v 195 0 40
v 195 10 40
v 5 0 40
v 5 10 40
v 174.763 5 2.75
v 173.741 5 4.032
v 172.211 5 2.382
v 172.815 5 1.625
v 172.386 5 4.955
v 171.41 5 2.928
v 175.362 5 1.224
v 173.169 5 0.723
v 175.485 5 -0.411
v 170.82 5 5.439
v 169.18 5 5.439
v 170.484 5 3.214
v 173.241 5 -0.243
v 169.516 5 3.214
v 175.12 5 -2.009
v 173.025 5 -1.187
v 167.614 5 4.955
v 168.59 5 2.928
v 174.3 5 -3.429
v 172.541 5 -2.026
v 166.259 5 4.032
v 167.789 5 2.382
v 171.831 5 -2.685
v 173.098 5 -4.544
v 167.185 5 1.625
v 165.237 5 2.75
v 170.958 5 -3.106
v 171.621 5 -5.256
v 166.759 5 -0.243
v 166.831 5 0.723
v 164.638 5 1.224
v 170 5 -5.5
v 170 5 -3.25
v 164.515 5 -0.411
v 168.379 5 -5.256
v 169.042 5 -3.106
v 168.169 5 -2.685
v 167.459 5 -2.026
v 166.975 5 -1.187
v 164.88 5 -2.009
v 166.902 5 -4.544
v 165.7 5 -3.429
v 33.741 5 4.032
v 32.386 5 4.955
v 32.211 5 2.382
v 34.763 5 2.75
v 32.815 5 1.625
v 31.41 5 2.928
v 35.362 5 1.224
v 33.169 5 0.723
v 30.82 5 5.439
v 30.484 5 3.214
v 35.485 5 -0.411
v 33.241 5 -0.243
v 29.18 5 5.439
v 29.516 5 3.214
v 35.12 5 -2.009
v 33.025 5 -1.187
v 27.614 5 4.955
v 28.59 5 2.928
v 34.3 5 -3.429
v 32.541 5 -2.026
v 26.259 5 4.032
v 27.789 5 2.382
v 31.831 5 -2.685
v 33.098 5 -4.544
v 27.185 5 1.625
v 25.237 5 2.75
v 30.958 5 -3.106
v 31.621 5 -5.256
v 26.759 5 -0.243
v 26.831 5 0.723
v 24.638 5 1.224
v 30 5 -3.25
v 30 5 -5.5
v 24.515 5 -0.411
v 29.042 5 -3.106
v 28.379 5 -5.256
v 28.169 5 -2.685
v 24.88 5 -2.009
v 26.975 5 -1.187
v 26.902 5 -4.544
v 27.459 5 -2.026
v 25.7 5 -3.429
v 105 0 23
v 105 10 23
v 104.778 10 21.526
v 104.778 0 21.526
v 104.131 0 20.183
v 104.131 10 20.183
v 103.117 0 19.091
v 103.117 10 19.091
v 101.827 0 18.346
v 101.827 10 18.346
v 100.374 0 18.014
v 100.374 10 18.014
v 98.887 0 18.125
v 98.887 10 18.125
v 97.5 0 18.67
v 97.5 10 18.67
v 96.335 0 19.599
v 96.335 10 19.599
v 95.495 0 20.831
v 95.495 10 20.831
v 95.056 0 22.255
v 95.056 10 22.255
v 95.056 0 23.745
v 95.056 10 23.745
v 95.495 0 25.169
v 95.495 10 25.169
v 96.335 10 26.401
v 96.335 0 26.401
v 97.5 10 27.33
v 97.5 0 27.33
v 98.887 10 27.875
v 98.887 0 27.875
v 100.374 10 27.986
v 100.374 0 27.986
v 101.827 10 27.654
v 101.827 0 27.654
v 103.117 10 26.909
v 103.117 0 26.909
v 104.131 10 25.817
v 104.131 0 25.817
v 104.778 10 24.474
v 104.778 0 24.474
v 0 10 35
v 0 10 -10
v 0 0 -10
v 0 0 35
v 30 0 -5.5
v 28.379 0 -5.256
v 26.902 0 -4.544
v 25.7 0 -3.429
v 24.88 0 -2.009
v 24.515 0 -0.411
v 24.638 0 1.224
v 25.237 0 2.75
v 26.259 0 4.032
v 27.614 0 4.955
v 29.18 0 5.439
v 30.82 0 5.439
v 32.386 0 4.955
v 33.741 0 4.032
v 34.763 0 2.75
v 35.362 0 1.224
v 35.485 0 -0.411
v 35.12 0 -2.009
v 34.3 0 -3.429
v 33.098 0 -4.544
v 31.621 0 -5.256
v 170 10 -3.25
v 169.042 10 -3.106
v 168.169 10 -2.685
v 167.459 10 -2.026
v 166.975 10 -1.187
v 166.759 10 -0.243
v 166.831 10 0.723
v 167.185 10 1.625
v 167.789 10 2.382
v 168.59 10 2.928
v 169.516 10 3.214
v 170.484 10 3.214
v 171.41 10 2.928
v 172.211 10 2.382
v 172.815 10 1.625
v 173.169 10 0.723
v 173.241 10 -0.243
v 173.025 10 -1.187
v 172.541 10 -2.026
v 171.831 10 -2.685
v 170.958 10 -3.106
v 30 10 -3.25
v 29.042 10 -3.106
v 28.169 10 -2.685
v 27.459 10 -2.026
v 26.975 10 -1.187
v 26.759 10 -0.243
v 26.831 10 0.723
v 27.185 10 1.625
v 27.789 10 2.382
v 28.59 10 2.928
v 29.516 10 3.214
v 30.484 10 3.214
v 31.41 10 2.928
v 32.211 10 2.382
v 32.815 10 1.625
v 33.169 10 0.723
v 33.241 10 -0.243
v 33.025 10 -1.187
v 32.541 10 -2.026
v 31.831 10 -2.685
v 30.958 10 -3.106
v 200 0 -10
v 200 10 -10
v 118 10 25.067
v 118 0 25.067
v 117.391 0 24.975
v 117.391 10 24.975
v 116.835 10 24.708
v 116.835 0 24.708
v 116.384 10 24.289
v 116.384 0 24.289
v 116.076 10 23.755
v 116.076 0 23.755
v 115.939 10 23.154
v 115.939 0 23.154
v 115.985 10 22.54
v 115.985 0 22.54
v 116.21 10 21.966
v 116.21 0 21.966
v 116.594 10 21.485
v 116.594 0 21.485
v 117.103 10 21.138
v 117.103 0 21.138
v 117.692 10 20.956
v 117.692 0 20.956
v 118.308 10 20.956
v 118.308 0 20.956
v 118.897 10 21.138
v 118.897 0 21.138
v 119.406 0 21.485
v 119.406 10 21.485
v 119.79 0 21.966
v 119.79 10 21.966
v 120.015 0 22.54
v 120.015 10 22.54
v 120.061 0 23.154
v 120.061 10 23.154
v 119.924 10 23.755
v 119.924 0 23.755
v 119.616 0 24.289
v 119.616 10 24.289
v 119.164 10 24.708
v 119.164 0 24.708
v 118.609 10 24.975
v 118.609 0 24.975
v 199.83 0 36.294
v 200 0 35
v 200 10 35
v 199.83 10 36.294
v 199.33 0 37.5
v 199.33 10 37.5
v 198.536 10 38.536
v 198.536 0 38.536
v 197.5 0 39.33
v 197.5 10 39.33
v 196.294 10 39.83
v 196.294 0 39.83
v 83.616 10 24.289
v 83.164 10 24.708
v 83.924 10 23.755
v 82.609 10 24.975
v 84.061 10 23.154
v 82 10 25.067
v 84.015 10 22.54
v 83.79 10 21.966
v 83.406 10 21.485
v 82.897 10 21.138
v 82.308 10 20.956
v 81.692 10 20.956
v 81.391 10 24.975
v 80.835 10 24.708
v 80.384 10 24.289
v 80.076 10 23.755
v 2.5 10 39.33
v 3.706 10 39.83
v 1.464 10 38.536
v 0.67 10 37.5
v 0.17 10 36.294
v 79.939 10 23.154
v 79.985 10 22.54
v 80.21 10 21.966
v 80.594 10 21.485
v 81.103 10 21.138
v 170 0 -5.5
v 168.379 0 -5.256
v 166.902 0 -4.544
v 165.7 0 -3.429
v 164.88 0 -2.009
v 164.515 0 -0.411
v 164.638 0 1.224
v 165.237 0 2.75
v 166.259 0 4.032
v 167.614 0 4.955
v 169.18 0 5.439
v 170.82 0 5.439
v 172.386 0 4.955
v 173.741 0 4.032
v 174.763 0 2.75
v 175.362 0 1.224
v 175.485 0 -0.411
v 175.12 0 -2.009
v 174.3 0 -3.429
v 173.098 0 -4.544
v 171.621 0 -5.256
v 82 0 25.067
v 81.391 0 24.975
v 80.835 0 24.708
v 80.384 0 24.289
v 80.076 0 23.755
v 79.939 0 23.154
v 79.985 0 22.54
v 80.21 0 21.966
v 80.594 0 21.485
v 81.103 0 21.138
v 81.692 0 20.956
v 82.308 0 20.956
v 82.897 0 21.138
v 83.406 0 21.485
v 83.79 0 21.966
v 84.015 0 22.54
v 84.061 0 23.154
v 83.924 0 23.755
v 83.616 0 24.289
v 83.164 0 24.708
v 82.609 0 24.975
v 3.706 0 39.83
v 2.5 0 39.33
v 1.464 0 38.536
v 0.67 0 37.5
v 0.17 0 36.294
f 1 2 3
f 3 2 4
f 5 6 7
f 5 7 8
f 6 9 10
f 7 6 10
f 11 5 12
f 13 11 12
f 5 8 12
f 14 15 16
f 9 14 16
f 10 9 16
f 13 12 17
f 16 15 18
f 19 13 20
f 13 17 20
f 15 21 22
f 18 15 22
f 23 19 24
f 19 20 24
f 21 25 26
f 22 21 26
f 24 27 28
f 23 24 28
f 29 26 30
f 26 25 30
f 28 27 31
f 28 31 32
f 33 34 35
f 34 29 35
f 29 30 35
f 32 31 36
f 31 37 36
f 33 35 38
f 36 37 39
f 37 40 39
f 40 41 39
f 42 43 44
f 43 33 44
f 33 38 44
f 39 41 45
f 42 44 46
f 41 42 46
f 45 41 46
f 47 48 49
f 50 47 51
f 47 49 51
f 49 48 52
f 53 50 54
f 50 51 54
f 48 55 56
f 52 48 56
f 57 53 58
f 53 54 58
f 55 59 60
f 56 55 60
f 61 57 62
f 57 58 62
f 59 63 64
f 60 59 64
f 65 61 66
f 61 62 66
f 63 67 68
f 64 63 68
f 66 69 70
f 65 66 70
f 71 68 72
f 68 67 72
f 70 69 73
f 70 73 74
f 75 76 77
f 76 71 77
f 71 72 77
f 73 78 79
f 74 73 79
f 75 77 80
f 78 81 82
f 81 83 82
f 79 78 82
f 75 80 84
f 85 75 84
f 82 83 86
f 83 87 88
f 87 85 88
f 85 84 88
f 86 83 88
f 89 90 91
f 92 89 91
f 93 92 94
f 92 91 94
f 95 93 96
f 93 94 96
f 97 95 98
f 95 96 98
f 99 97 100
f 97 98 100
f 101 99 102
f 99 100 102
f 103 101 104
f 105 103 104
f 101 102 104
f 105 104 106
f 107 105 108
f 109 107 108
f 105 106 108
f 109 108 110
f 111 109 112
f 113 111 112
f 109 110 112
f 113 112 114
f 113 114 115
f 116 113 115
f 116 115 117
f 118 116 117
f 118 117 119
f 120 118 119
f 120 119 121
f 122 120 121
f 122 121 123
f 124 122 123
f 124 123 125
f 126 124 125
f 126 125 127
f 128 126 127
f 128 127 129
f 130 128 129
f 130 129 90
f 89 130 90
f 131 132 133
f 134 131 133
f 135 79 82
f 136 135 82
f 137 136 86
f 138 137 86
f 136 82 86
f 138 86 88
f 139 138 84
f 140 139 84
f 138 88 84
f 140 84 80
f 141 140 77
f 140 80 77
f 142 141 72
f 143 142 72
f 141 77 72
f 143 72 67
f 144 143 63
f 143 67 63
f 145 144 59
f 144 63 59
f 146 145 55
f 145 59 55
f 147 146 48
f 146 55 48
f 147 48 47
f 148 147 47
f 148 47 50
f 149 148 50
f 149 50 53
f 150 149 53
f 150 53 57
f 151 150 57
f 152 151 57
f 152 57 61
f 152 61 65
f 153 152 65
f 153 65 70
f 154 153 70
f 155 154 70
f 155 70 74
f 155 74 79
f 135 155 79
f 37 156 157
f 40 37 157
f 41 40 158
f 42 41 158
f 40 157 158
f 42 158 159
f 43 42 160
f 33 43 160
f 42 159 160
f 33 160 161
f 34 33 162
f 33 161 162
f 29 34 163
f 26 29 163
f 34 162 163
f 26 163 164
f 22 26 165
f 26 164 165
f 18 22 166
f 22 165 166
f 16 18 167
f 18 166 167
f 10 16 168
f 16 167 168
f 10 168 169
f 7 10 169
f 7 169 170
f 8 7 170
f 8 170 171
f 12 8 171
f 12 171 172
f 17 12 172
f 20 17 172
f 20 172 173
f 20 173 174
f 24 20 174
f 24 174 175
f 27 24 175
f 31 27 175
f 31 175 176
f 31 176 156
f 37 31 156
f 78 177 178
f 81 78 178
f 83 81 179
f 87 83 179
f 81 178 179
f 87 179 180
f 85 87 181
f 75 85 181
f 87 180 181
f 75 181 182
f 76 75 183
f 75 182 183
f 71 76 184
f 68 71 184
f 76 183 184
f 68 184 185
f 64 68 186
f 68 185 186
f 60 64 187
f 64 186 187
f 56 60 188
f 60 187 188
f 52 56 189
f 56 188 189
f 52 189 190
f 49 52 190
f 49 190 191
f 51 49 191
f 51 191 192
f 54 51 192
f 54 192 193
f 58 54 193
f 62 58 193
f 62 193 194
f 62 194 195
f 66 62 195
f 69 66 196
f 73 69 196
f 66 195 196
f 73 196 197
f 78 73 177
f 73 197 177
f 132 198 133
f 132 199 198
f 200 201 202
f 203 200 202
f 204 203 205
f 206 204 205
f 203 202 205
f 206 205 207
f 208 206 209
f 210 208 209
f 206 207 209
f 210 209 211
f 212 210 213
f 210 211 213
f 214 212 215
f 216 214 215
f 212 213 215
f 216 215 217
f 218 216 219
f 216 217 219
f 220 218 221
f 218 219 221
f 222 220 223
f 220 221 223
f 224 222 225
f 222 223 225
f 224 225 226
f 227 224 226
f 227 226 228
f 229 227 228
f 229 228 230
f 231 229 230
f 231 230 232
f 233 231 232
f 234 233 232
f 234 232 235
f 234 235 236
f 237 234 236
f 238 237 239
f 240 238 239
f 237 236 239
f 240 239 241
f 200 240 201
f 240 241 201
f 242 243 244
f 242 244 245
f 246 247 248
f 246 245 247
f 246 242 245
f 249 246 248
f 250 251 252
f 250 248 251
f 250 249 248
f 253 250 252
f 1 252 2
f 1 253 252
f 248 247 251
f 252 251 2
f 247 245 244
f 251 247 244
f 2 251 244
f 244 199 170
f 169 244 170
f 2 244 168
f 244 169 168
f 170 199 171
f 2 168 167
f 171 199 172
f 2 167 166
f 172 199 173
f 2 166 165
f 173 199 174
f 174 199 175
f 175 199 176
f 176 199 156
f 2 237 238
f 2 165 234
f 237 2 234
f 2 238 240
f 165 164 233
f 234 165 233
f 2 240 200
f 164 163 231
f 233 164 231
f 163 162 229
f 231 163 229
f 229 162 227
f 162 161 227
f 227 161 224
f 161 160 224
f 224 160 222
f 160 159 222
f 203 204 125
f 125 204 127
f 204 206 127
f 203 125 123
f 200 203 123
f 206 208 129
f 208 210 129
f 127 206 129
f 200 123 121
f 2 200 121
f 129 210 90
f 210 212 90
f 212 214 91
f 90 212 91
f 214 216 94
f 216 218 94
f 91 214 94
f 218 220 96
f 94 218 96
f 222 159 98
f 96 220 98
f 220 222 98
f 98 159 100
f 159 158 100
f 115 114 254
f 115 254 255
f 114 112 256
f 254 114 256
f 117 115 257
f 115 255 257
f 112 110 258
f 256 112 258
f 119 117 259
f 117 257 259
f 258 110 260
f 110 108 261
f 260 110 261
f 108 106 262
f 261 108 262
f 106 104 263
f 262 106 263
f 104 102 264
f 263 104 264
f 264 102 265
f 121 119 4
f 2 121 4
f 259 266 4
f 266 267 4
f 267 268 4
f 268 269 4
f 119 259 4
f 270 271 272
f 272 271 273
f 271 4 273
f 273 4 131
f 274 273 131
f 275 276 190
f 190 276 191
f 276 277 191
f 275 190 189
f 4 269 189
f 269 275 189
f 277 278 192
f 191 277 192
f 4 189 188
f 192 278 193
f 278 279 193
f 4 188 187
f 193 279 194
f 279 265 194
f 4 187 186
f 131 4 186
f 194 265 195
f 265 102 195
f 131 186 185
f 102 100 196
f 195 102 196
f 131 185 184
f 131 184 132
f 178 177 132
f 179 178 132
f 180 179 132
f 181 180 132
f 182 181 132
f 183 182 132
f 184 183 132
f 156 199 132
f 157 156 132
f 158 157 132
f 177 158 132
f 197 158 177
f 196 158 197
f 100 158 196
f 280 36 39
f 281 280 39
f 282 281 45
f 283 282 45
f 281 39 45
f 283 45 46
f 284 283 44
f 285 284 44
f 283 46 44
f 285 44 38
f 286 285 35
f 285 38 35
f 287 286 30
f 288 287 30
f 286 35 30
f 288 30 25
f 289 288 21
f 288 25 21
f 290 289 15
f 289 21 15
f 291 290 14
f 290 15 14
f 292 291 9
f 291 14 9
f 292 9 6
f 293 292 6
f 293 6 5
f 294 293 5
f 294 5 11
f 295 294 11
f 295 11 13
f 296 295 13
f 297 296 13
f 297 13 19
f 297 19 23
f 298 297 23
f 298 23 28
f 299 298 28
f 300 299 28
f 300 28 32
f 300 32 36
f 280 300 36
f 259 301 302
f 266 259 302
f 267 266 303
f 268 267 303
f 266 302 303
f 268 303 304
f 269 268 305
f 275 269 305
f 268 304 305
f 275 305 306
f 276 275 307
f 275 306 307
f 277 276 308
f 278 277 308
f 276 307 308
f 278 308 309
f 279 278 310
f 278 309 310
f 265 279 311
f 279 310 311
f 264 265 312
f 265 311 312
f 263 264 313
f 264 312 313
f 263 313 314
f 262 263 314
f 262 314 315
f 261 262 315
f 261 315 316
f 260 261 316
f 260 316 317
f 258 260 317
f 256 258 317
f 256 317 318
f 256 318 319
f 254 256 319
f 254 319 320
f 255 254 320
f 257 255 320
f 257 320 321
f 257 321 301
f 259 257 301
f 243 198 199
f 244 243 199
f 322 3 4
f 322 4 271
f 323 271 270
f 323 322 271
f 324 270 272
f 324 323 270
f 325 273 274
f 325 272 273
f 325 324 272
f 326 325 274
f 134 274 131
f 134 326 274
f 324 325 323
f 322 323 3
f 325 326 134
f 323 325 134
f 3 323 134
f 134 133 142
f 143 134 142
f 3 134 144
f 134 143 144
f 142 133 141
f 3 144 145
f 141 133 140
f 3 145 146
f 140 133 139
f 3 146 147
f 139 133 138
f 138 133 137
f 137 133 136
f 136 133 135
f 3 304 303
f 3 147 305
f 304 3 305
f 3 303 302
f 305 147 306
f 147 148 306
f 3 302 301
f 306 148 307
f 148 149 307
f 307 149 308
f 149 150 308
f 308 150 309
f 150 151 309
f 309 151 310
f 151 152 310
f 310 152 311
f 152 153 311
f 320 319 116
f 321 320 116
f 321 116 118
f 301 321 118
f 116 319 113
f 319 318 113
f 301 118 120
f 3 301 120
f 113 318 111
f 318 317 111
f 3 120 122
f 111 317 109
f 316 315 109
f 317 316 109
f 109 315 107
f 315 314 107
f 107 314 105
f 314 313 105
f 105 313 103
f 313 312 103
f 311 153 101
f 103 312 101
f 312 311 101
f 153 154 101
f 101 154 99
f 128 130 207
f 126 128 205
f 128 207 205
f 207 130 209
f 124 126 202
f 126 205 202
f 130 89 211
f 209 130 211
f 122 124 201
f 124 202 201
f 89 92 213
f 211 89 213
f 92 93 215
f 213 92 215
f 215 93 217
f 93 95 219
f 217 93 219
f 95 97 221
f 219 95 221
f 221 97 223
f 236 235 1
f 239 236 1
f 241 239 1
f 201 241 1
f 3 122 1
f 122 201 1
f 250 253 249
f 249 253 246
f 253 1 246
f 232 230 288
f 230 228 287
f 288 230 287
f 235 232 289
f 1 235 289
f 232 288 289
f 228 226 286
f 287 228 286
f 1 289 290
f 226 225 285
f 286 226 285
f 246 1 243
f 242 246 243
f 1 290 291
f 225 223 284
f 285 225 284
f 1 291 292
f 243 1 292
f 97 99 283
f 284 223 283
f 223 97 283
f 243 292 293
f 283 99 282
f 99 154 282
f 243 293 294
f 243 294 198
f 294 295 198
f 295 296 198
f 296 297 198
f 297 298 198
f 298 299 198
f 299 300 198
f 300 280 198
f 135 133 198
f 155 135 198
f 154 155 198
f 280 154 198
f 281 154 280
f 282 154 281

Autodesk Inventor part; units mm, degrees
ref_plane "YZ Plane" through (0, 0, 0) normal (1, 0, 0) x (0, 1, 0)
ref_plane "XZ Plane" through (0, 0, 0) normal (0, 1, 0) x (-1, 0, 0)
ref_plane "XY Plane" through (0, 0, 0) normal (0, 0, 1) x (1, 0, 0)
sketch "Sketch1" plane through (0, 0, 0) normal (0, 0, 1) x (1, 0, 0)
  line L0 (0, 0) -> (200, 0)
  line L1 (200, 0) -> (200, 10)
  line L2 (200, 10) -> (0, 10)
  line L3 (0, 10) -> (0, 0)
  dimension "d0" = 200
  dimension "d1" = 10
extrude "Extrusion1" add sketch "Sketch1" along normal blind 50
sketch "Sketch2" plane through (0, 10, 0) normal (0, 1, 0) x (1, 0, 0)
  line L0 (200, 0) -> (200, -50) projected
  line L1 (200, -23) -> (-0.0003, -23)
  line L2 (200, 0) -> (0, 0) projected
  line L3 (100, 0) -> (100, -50)
  line L4 (200, -50) -> (0, -50) projected
  circle A0 centre (81.9998, -23) radius 2.5
  circle A1 centre (117.9998, -23) radius 2.5
  point P0 (99.9998, -23)
  dimension "d4" = 23
  dimension "d5" = 5
  dimension "d6" = 5
  dimension "d7" = 18
  dimension "d8" = 36
sketch "Sketch3" plane through (0, 0, 0) normal (0, 0, -1) x (-1, 0, 0)
  line L0 (0, 0) -> (-200, 0) projected
  line L1 (-200, 10) -> (0, 10) projected
  line L2 (0, 0) -> (-200, 0)
  line L3 (-200, 0) -> (-200, 10)
  line L4 (-200, 10) -> (0, 10)
  line L5 (0, 10) -> (0, 0)
extrude "Extrusion3" add sketch "Sketch3" along normal blind 10
sketch "Sketch4" plane through (0, 10, 50) normal (0, 1, 0) x (1, 0, 0)
  line L0 (0, 0) -> (200, 0) projected
  line L1 (100, 0) -> (100, 60)
  line L2 (0, 60) -> (200, 60) projected
  circle A0 centre (100, 27) radius 5
  point P0 (0, 50)
  dimension "d17" = 10
  dimension "d39" = 33
extrude "Extrusion4" cut sketch "Sketch4" against normal blind 10
sketch "Sketch5" plane through (0, 0, 50) normal (0, -1, 0) x (1, 0, 0)
  line L0 (140, -40) -> (140, -50) projected
  line L1 (140, -50) -> (60, -50) projected
  line L2 (60, -50) -> (60, -40) projected
  line L3 (0, -40) -> (60, -40) projected
  line L4 (0, -60) -> (0, -40) projected
  line L5 (0, -60) -> (200, -60) projected
  line L6 (200, -60) -> (200, -40) projected
  line L7 (140, -40) -> (200, -40) projected
  circle A0 centre (30, -50) radius 2.4585 projected
  circle A1 centre (170, -50) radius 2.4585 projected
  point P0 (0, -50)
  point P1 (170, -50)
  point P2 (30, -50)
  point P3 (200, -50)
  point P4 (170, -40)
  point P5 (30, -40)
hole "Hole1" at (170, 0, 0) at (30, 0, 0) direction (0, 1, 0) diameter 6.5 end through all counterbore diameter 11 counterbore depth 5
hole "Hole2" at (81.9998, 10, 23) at (117.9998, 10, 23) direction (0, -1, 0) diameter 4.134 end through all thread size "M5x0.8" class "6H" standard "ISO Metric profile"
sketch "Sketch6" plane through (0, 10, 50) normal (0, 1, 0) x (1, 0, 0)
  line L0 (200, 0) -> (0, 0) projected
  line L1 (0, 0) -> (200, 0)
  line L2 (200, 0) -> (200, 10)
  line L3 (200, 10) -> (0, 10)
  line L4 (0, 10) -> (0, 0)
  point P0 (0, 50)
  dimension "d35" = 10
extrude "Extrusion5" cut sketch "Sketch6" against normal through all
sketch "Sketch7" plane through (0, 10, -10) normal (0, 1, 0) x (1, 0, 0)
  point P0 (0, -10)
fillet "Fillet3" radius 5 2 edges at (0, 5, 40) (200, 5, 40)
properties part number "Nap_duoi"
